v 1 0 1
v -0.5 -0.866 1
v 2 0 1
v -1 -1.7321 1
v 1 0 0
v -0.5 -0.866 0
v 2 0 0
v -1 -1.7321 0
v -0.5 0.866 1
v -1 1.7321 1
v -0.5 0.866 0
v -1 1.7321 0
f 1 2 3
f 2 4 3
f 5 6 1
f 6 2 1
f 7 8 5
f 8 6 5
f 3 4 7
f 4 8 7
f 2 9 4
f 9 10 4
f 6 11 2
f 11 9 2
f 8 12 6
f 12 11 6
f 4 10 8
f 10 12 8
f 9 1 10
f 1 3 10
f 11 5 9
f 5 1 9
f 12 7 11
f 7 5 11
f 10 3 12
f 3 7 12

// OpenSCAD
rotate_extrude(angle=-360, $fn=3) translate([-2,0]) square([1,1]);
